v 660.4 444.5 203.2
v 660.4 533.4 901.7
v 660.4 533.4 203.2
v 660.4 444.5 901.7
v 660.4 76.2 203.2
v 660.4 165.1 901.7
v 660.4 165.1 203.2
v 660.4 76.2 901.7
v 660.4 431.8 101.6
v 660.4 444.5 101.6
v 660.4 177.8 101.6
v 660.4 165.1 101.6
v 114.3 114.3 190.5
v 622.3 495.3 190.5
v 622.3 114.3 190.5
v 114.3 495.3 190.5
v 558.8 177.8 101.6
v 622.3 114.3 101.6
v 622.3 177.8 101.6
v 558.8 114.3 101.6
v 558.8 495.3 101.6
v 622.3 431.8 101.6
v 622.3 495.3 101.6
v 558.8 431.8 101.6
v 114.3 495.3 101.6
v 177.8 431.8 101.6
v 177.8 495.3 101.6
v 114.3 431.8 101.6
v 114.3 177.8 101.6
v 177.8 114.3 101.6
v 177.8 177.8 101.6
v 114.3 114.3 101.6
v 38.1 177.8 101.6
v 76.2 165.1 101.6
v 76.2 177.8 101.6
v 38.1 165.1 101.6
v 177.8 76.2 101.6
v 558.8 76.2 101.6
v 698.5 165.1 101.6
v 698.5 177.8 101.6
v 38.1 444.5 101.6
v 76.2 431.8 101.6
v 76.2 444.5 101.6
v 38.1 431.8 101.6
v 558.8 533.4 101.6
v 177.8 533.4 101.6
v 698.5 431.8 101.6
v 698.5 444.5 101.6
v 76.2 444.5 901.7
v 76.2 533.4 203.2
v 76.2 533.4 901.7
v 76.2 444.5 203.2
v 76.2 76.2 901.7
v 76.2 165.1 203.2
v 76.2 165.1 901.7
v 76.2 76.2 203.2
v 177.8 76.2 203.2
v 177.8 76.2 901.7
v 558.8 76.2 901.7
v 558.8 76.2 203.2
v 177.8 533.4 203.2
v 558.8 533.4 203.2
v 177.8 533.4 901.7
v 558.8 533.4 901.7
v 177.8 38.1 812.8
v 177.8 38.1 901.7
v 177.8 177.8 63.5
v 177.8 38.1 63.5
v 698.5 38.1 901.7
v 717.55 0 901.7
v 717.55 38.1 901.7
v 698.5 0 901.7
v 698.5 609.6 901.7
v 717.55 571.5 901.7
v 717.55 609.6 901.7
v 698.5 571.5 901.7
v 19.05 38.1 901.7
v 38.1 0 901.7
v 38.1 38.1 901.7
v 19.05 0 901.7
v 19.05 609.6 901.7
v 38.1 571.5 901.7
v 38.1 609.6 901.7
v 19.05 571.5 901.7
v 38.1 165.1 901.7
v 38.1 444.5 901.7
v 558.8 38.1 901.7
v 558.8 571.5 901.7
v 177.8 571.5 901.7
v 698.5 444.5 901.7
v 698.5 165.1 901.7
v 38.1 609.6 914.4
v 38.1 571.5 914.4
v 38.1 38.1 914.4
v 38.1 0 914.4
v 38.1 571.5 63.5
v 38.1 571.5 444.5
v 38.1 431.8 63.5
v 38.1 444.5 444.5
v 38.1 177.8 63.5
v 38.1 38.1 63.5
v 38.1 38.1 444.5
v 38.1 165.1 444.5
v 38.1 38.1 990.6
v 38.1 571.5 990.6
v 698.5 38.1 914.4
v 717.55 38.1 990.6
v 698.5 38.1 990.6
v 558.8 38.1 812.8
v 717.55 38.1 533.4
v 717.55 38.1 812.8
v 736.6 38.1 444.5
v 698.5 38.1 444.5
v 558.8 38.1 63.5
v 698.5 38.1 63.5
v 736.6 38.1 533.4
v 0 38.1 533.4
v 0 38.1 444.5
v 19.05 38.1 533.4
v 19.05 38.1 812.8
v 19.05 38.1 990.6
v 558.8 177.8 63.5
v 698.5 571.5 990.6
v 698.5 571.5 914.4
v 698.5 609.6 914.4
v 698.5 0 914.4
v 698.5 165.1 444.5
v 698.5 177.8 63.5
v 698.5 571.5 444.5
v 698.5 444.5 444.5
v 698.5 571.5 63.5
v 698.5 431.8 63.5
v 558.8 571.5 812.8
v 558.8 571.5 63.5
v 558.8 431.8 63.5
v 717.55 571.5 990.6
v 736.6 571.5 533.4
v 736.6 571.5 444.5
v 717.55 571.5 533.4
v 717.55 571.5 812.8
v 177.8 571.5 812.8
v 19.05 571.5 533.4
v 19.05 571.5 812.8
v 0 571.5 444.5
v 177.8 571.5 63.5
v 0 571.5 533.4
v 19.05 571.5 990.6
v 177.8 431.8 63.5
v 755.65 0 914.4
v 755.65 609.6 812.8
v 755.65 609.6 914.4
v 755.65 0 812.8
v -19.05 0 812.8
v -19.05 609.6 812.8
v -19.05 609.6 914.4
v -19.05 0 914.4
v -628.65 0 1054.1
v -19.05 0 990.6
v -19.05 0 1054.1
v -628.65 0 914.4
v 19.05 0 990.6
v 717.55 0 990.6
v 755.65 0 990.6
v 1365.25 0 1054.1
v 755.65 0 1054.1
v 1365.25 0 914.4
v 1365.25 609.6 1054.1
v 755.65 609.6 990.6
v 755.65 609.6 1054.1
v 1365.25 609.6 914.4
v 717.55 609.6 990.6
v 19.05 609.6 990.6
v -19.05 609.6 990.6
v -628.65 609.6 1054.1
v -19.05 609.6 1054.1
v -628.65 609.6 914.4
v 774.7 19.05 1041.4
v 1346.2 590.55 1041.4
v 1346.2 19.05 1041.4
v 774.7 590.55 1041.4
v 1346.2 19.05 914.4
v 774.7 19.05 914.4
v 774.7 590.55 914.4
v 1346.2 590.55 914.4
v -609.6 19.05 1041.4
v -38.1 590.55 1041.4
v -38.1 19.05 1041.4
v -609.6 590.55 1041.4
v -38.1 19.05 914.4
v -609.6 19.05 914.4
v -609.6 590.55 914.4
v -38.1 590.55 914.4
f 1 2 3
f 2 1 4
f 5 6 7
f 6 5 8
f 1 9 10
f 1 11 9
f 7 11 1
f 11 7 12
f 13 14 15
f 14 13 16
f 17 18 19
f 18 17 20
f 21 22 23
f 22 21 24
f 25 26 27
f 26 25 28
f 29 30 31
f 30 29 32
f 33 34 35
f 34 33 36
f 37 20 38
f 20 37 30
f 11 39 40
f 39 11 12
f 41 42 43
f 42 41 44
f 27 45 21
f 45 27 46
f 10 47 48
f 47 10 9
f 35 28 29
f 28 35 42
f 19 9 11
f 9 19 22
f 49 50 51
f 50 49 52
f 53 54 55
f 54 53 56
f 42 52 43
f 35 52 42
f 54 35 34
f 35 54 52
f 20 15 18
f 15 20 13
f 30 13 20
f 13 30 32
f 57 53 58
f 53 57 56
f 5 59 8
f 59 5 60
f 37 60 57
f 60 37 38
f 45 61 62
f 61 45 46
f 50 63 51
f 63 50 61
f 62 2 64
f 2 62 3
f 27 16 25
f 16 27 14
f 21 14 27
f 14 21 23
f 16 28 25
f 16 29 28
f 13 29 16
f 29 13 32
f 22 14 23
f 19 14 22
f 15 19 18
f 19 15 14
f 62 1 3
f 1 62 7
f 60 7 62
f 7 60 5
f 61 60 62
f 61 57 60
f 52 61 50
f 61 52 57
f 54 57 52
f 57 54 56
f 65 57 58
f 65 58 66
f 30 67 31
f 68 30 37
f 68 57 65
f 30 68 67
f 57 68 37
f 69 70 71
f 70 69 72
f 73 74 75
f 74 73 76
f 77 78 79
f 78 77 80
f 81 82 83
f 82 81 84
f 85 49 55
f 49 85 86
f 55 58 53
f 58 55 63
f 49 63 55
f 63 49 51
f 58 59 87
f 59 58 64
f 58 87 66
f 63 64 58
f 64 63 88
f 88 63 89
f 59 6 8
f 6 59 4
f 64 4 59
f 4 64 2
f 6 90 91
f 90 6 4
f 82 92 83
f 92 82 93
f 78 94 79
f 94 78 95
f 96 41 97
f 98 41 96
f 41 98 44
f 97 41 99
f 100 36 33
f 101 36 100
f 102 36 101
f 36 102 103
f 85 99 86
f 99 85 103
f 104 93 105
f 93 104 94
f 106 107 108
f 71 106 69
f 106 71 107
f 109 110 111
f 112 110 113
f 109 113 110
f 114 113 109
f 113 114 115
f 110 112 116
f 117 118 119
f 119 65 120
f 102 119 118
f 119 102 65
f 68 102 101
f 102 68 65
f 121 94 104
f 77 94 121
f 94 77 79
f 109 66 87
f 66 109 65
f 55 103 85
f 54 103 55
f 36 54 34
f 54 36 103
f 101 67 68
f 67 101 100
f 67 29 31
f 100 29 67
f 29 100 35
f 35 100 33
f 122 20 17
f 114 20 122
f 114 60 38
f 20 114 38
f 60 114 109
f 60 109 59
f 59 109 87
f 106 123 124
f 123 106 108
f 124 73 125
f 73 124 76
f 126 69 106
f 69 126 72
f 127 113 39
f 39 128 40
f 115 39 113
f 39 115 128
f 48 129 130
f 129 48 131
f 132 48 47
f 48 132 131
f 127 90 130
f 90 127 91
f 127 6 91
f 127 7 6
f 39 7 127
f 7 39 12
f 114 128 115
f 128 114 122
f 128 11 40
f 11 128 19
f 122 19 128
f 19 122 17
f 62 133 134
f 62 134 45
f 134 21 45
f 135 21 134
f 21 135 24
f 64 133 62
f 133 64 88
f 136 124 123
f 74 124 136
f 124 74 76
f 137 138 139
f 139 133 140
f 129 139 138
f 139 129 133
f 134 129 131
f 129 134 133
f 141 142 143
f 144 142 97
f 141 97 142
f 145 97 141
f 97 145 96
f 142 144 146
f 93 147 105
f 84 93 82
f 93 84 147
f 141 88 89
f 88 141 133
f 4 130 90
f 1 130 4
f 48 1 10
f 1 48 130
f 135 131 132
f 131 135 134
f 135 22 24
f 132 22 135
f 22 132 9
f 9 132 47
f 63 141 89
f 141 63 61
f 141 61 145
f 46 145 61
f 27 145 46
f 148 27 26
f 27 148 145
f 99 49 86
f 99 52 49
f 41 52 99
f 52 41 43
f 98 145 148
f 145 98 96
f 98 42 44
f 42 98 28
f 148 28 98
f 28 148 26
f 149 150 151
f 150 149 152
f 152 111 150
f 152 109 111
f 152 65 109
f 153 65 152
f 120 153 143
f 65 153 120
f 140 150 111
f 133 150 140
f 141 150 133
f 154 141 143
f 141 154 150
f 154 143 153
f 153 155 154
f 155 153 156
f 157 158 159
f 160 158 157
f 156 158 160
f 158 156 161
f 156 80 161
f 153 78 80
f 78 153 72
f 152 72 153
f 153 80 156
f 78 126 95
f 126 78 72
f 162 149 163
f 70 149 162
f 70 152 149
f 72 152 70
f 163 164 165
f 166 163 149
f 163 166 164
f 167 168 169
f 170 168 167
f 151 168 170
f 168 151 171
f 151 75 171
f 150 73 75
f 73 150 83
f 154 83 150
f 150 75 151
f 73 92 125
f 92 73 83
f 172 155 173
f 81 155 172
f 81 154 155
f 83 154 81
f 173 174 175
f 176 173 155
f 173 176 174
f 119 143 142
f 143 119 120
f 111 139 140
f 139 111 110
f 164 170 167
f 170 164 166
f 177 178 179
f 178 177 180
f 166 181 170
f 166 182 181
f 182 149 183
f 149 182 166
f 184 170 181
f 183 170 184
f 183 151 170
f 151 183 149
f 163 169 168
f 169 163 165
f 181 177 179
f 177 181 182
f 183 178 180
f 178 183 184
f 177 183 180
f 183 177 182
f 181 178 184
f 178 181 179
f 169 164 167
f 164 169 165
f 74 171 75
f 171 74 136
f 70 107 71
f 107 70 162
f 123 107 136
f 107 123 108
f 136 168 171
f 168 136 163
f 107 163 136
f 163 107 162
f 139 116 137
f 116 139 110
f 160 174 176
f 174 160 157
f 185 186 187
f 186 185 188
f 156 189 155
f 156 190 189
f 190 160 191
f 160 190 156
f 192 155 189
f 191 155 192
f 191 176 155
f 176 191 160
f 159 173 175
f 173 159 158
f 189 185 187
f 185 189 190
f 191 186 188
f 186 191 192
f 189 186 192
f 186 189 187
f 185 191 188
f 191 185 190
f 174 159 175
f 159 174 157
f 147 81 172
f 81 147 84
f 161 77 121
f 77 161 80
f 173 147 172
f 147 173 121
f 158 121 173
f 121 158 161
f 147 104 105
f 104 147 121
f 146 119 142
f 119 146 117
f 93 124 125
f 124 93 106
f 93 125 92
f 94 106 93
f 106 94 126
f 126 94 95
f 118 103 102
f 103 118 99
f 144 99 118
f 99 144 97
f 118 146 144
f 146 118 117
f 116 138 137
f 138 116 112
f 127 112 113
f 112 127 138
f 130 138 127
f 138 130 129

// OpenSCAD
union() {
	scale(v = 25.4000000000) {
		translate(v = [3.0000000000, 3.0000000000, 4]) {
			cube(size = [23.0000000000, 1.5000000000, 3.5000000000]);
			translate(v = [0, 16.5000000000, 0]) {
				cube(size = [23.0000000000, 1.5000000000, 3.5000000000]);
			}
			translate(v = [0, 1.5000000000, 0]) {
				cube(size = [1.5000000000, 15.0000000000, 3.5000000000]);
			}
			translate(v = [21.5000000000, 1.5000000000, 0]) {
				cube(size = [1.5000000000, 15.0000000000, 3.5000000000]);
			}
			translate(v = [0, 0, 3.5000000000]) {
				cube(size = [23.0000000000, 18.0000000000, 0.5000000000]);
			}
		}
		translate(v = [1.5000000000, 1.5000000000, 4]) {
			cube(size = [5.5000000000, 1.5000000000, 31.5000000000]);
			translate(v = [0, 1.5000000000, 0]) {
				cube(size = [1.5000000000, 3.5000000000, 31.5000000000]);
			}
			translate(v = [0, 0, -1.5000000000]) {
				cube(size = [5.5000000000, 5.5000000000, 1.5000000000]);
			}
		}
		translate(v = [27.5000000000, 1.5000000000, 4]) {
			scale(v = [-1, 1, 1]) {
				cube(size = [5.5000000000, 1.5000000000, 31.5000000000]);
				translate(v = [0, 1.5000000000, 0]) {
					cube(size = [1.5000000000, 3.5000000000, 31.5000000000]);
				}
				translate(v = [0, 0, -1.5000000000]) {
					cube(size = [5.5000000000, 5.5000000000, 1.5000000000]);
				}
			}
		}
		translate(v = [27.5000000000, 22.5000000000, 4]) {
			scale(v = [-1, -1, 1]) {
				cube(size = [5.5000000000, 1.5000000000, 31.5000000000]);
				translate(v = [0, 1.5000000000, 0]) {
					cube(size = [1.5000000000, 3.5000000000, 31.5000000000]);
				}
				translate(v = [0, 0, -1.5000000000]) {
					cube(size = [5.5000000000, 5.5000000000, 1.5000000000]);
				}
			}
		}
		translate(v = [1.5000000000, 22.5000000000, 4]) {
			scale(v = [1, -1, 1]) {
				cube(size = [5.5000000000, 1.5000000000, 31.5000000000]);
				translate(v = [0, 1.5000000000, 0]) {
					cube(size = [1.5000000000, 3.5000000000, 31.5000000000]);
				}
				translate(v = [0, 0, -1.5000000000]) {
					cube(size = [5.5000000000, 5.5000000000, 1.5000000000]);
				}
			}
		}
		translate(v = [0, 0, 32.0000000000]) {
			translate(v = [-0.7500000000, 0, 0]) {
				cube(size = [30.5000000000, 1.5000000000, 3.5000000000]);
			}
			translate(v = [-0.7500000000, 22.5000000000, 0]) {
				cube(size = [30.5000000000, 1.5000000000, 3.5000000000]);
			}
			translate(v = [-0.7500000000, 1.5000000000, 0]) {
				cube(size = [1.5000000000, 21.0000000000, 3.5000000000]);
			}
			translate(v = [28.2500000000, 1.5000000000, 0]) {
				cube(size = [1.5000000000, 21.0000000000, 3.5000000000]);
			}
		}
		translate(v = [1.5000000000, 0, 35.5000000000]) {
			cube(size = [26, 24, 0.5000000000]);
		}
		translate(v = [0, 1.5000000000, 17.5000000000]) {
			cube(size = [1.5000000000, 21, 3.5000000000]);
		}
		translate(v = [27.5000000000, 1.5000000000, 17.5000000000]) {
			cube(size = [1.5000000000, 21, 3.5000000000]);
		}
		translate(v = [27.5000000000, 0, 36]) {
			translate(v = [0, 1.5000000000, -15.0000000000]) {
				cube(size = [0.7500000000, 21.0000000000, 18]);
			}
			translate(v = [0.7500000000, 0, -0.5000000000]) {
				cube(size = [1.5000000000, 24, 3.5000000000]);
			}
			translate(v = [2.2500000000, 0, 0]) {
				rotate(a = 0, v = [0, 1, 0]) {
					translate(v = [0, 0, 0]) {
						cube(size = [24, 0.7500000000, 5]);
					}
					translate(v = [0, 23.2500000000, 0]) {
						cube(size = [24, 0.7500000000, 5]);
					}
					translate(v = [0, 0.7500000000, 0]) {
						cube(size = [0.7500000000, 22.5000000000, 5]);
					}
					translate(v = [23.2500000000, 0.7500000000, 0]) {
						cube(size = [0.7500000000, 22.5000000000, 5]);
					}
					translate(v = [0, 0, 5]) {
						cube(size = [24, 24, 0.5000000000]);
					}
				}
			}
		}
		translate(v = [1.5000000000, 0, 36]) {
			scale(v = [-1, 1, 1]) {
				translate(v = [0, 1.5000000000, -15.0000000000]) {
					cube(size = [0.7500000000, 21.0000000000, 18]);
				}
				translate(v = [0.7500000000, 0, -0.5000000000]) {
					cube(size = [1.5000000000, 24, 3.5000000000]);
				}
				translate(v = [2.2500000000, 0, 0]) {
					rotate(a = 0, v = [0, 1, 0]) {
						translate(v = [0, 0, 0]) {
							cube(size = [24, 0.7500000000, 5]);
						}
						translate(v = [0, 23.2500000000, 0]) {
							cube(size = [24, 0.7500000000, 5]);
						}
						translate(v = [0, 0.7500000000, 0]) {
							cube(size = [0.7500000000, 22.5000000000, 5]);
						}
						translate(v = [23.2500000000, 0.7500000000, 0]) {
							cube(size = [0.7500000000, 22.5000000000, 5]);
						}
						translate(v = [0, 0, 5]) {
							cube(size = [24, 24, 0.5000000000]);
						}
					}
				}
			}
		}
	}
}
